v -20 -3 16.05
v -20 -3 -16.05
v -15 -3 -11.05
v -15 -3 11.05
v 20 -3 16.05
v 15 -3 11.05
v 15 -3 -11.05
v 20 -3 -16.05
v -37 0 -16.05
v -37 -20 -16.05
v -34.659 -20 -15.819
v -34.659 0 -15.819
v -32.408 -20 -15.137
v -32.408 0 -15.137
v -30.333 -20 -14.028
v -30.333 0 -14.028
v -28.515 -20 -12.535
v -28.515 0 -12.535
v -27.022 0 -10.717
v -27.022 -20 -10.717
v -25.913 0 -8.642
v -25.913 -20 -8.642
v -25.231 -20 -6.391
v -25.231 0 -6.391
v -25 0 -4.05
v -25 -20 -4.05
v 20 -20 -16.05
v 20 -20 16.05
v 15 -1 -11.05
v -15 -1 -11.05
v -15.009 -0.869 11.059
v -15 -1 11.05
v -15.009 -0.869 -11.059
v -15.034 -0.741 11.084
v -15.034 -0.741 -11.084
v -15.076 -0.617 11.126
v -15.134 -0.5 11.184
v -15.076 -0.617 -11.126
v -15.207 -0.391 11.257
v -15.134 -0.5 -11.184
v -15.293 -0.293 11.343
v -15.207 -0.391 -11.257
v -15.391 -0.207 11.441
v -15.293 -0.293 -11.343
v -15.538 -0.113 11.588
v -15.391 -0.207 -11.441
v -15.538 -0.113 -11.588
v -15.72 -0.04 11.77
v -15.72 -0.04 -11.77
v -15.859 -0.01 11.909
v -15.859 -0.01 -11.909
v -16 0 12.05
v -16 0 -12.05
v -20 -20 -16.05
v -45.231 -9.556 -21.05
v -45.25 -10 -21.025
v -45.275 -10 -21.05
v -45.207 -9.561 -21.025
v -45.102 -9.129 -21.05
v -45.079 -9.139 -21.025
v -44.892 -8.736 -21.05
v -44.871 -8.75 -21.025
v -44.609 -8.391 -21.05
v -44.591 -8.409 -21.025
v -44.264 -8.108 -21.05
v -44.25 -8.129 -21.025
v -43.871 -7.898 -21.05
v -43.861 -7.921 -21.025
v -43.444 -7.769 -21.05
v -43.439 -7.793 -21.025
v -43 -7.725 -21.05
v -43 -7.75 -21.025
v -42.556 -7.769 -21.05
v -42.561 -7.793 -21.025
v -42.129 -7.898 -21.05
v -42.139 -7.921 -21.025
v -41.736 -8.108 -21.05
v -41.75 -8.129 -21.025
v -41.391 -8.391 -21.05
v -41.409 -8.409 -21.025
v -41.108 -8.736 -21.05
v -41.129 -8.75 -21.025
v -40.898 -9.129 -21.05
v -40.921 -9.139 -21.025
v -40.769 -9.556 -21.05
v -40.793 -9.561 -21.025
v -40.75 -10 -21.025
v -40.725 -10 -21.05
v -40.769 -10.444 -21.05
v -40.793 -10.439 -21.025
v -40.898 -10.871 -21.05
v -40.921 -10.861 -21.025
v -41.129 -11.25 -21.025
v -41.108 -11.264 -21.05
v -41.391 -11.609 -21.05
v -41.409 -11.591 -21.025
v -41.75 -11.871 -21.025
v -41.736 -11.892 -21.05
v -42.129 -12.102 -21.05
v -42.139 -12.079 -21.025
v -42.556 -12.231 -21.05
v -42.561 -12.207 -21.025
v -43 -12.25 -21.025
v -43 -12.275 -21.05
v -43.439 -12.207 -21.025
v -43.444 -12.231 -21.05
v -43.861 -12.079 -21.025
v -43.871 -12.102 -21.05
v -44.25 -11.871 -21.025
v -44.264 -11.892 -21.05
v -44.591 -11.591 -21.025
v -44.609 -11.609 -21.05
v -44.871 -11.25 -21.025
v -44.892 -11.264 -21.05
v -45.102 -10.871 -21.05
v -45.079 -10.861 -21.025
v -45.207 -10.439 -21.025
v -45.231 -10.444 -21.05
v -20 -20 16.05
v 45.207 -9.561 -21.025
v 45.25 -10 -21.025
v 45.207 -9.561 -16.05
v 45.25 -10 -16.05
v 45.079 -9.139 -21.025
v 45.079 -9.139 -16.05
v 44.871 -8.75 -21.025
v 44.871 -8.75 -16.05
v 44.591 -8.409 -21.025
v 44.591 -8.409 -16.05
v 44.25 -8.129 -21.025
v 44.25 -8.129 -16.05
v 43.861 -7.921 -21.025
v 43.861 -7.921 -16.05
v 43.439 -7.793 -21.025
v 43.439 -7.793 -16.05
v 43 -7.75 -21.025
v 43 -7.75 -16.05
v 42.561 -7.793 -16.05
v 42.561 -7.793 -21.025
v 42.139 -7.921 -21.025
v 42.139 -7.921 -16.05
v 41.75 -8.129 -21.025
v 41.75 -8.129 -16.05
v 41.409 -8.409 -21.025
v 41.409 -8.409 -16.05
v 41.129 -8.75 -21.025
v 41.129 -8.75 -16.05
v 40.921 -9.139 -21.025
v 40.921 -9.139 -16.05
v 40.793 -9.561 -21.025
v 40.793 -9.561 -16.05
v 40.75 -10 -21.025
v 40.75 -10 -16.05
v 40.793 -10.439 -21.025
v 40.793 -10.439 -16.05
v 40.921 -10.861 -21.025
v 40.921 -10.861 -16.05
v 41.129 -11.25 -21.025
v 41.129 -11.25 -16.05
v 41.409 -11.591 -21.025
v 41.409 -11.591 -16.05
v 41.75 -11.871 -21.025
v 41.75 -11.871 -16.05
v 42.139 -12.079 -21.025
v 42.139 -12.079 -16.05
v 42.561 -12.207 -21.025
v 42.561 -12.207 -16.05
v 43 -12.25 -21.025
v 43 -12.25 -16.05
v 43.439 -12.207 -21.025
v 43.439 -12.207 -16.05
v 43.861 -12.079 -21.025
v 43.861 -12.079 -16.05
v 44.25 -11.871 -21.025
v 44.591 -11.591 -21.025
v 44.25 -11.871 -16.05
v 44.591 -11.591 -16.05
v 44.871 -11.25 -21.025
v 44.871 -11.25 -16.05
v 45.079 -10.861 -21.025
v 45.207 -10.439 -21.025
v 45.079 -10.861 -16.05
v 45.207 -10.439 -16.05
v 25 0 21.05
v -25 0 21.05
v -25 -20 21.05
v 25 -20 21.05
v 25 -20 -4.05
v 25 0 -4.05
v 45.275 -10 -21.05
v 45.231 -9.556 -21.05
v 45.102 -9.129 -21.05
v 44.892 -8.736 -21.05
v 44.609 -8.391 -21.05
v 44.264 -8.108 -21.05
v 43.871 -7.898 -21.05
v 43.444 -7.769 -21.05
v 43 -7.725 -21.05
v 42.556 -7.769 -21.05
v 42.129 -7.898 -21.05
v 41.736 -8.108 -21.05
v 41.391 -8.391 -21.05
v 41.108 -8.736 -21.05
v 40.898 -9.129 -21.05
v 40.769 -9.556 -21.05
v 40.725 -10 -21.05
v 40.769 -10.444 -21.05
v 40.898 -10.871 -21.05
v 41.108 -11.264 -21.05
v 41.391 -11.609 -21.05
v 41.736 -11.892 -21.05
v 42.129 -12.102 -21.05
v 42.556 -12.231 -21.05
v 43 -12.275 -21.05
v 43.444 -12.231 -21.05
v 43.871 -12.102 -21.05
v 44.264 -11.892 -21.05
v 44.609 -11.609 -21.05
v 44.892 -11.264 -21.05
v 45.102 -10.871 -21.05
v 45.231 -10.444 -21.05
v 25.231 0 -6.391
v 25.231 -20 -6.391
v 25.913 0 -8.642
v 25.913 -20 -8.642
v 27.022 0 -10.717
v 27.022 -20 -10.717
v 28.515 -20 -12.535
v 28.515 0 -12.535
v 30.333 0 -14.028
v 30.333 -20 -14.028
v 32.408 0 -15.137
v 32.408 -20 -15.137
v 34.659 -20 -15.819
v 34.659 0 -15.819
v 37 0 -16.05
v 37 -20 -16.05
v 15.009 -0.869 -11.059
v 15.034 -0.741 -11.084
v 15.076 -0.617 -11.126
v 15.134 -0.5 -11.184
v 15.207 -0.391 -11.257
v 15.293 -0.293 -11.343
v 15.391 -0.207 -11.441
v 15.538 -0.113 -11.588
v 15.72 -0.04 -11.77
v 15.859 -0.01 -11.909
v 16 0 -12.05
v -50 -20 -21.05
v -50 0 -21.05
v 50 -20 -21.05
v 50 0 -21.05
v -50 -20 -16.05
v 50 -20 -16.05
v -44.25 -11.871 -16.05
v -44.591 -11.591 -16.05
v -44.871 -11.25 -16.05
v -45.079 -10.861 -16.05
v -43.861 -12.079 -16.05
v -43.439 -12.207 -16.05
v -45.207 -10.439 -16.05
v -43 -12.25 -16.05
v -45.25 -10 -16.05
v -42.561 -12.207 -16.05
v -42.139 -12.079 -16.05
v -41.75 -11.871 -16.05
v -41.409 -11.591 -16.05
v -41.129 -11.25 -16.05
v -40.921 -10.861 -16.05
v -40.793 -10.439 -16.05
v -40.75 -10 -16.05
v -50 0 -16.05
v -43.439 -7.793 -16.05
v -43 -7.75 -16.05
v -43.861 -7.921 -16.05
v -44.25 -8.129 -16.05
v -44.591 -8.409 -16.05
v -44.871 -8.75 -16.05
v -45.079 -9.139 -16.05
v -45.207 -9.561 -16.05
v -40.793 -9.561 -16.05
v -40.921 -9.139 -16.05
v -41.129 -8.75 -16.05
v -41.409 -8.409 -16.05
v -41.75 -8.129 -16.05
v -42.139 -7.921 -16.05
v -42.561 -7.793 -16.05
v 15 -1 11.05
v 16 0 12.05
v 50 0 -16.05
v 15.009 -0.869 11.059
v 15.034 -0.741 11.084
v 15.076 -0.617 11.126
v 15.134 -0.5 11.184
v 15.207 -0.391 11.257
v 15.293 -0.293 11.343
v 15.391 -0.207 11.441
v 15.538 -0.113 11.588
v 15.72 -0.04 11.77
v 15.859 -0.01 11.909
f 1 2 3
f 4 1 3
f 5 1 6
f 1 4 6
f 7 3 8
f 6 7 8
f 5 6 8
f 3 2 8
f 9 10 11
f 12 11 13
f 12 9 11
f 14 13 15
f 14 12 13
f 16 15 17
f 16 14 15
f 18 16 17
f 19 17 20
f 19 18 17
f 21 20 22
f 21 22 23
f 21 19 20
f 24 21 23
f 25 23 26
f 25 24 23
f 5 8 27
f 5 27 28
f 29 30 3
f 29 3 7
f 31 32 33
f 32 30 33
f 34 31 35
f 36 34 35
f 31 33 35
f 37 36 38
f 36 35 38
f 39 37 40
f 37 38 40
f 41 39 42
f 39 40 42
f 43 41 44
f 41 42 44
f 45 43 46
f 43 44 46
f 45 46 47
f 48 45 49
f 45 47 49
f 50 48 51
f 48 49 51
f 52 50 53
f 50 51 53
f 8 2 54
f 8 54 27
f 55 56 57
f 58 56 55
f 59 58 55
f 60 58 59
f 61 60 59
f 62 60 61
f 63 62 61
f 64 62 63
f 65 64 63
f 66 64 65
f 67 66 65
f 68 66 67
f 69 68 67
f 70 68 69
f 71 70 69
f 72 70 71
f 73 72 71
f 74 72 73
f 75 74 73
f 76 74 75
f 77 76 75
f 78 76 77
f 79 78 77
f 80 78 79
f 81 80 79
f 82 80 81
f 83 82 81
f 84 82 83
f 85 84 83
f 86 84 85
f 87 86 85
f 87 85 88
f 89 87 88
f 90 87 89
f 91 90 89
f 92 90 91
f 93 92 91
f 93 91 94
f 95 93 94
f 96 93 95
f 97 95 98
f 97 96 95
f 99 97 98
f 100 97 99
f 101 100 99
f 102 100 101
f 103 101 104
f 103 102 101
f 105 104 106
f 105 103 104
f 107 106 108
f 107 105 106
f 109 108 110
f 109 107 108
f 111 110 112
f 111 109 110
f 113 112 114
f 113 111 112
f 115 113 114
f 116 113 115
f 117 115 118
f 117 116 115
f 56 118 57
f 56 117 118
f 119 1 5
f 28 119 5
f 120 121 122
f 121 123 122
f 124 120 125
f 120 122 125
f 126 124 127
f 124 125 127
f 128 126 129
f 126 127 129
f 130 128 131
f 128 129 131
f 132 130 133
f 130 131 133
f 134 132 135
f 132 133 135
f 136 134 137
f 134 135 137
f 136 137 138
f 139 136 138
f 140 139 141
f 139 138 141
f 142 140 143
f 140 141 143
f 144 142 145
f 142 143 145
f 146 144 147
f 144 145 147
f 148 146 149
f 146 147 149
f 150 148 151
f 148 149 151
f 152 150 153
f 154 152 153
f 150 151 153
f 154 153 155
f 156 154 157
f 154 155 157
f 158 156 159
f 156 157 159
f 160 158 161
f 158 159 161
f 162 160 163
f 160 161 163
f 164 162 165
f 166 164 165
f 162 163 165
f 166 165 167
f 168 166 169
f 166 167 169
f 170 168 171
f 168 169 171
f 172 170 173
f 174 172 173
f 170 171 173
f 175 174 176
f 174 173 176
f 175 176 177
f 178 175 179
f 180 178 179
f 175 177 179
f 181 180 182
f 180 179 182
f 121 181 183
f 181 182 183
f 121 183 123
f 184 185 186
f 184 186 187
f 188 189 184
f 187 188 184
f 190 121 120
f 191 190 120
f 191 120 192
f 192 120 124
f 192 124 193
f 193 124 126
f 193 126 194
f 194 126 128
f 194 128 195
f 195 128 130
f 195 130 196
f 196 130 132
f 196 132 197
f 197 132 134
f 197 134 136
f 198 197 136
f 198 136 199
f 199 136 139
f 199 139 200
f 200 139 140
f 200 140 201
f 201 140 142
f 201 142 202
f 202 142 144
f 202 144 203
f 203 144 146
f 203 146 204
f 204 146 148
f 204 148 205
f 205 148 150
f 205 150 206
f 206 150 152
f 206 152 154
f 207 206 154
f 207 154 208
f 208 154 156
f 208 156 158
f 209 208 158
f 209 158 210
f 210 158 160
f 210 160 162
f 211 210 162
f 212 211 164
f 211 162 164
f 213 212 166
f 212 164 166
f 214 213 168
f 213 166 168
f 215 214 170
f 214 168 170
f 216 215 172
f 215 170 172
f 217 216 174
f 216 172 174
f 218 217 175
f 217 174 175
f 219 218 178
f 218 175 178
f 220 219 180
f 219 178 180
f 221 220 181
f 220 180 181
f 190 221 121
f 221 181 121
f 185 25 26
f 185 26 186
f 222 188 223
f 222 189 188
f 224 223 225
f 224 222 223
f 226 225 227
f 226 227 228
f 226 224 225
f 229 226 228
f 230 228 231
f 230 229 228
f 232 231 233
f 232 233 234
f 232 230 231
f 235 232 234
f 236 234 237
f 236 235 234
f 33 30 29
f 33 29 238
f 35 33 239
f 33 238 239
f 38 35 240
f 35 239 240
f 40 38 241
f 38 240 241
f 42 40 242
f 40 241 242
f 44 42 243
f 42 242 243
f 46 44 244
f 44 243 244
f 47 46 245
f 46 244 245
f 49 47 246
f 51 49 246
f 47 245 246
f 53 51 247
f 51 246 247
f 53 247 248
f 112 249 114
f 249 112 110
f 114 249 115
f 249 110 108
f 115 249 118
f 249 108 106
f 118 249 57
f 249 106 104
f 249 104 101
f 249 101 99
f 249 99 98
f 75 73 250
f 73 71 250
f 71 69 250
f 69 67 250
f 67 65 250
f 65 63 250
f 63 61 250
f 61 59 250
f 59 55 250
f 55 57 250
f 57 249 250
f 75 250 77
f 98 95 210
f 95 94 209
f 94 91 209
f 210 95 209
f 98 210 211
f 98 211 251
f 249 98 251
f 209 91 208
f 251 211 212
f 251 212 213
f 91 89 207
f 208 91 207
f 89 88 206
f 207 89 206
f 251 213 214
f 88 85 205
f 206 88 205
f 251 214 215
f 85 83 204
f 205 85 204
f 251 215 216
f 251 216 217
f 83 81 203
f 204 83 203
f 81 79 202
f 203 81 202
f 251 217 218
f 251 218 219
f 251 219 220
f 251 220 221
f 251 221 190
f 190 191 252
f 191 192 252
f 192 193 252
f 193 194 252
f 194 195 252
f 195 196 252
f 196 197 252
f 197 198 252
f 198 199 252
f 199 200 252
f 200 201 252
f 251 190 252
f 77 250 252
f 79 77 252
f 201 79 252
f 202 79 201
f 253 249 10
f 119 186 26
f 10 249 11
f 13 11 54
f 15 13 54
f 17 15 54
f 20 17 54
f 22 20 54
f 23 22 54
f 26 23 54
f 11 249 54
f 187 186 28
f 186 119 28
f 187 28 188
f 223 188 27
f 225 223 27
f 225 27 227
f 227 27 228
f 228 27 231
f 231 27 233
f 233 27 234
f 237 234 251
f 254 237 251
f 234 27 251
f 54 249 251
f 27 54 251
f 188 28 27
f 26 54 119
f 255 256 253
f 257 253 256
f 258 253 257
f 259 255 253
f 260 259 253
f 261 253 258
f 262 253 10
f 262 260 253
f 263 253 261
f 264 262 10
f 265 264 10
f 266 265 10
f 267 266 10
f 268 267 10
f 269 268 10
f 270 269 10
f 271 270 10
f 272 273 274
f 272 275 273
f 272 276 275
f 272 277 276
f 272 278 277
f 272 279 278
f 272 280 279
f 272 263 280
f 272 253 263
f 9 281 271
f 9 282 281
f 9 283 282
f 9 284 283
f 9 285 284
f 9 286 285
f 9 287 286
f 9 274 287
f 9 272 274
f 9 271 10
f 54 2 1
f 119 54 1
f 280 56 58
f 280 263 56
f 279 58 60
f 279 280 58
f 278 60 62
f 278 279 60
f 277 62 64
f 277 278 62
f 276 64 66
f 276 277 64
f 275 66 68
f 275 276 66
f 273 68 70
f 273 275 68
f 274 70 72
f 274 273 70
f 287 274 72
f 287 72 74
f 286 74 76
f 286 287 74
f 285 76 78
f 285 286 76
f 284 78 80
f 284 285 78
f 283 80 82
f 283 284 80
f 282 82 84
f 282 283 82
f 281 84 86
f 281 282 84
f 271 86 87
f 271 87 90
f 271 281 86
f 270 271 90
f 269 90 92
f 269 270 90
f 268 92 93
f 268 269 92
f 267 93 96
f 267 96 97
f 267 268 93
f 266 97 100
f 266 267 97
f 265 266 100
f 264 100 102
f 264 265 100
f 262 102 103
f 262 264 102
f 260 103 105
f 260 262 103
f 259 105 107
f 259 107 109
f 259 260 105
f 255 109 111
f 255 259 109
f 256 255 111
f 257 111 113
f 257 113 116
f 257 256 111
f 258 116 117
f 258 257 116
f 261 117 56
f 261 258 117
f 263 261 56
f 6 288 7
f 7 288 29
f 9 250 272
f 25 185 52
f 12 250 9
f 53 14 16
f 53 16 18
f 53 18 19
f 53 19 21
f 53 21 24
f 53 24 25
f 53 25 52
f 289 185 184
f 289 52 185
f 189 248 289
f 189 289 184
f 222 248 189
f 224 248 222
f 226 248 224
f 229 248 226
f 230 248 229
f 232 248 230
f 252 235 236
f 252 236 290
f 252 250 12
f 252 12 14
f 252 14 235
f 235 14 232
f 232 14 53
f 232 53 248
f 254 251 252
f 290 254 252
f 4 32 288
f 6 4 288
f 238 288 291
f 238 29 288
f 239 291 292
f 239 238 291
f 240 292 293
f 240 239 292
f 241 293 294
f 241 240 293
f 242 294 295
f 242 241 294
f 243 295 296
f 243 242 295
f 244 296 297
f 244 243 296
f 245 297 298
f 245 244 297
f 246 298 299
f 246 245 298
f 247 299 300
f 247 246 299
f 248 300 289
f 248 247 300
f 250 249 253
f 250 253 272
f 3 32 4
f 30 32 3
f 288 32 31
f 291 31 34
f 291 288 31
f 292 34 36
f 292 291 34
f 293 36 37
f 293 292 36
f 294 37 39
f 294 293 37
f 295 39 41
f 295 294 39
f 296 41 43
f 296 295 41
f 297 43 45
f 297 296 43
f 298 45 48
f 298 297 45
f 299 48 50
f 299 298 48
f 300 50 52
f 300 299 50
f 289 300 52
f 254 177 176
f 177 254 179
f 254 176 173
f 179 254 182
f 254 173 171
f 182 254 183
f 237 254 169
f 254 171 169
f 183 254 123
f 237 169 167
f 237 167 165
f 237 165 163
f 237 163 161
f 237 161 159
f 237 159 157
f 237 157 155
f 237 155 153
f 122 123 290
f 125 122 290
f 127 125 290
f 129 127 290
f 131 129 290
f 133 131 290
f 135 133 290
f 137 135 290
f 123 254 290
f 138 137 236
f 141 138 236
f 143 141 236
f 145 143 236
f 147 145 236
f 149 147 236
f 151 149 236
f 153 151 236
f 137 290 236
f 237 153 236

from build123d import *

# Parameters (mm, degrees)
SKETCH1_W                      = 50
SKETCH1_H                      = 42.1
SKETCH1_W_2                    = 30
SKETCH1_H_2                    = 22.1
BOSS_EXTRUDE2_DEPTH            = 3
FILLET1_R                      = 1
SKETCH2_W                      = 50
SKETCH2_H                      = 42.1
SKETCH2_W_2                    = 40
SKETCH2_H_2                    = 32.1
BOSS_EXTRUDE3_DEPTH            = 17
SKETCH3_W                      = 25
SKETCH3_H                      = 20
BOSS_EXTRUDE4_DEPTH            = 5
M4_CLEARANCE_HOLE1_D           = 4.5
M4_CLEARANCE_HOLE1_CSINK_D     = 4.55
M4_CLEARANCE_HOLE1_CSINK_ANGLE = 90
FILLET2_R                      = 12


with BuildPart() as part:
    # Sketch1 → Boss-Extrude2 (new body)
    with BuildSketch(Plane(origin=(0, 0, 0), x_dir=(1, 0, 0), z_dir=(0, 1, 0))):
        Rectangle(SKETCH1_W, SKETCH1_H)
        Rectangle(SKETCH1_W_2, SKETCH1_H_2, mode=Mode.SUBTRACT)
    extrude(amount=-BOSS_EXTRUDE2_DEPTH)

    # Fillet1
    fillet1_edges = [part.edges().sort_by_distance(p)[0] for p in [
        (15, 0, 0),
        (0, 0, -11.05),
        (-15, 0, 0),
        (0, 0, 11.05),
    ]]
    fillet(fillet1_edges, radius=FILLET1_R)

    # Sketch2 → Boss-Extrude3 (add)
    with BuildSketch(Plane.XZ.offset(3)):
        Rectangle(SKETCH2_W, SKETCH2_H)
        Rectangle(SKETCH2_W_2, SKETCH2_H_2, mode=Mode.SUBTRACT)
    extrude(amount=BOSS_EXTRUDE3_DEPTH)

    # Sketch3 → Boss-Extrude4 (add)
    with BuildSketch(Plane(origin=(0, 0, -21.05), x_dir=(-1, 0, 0), z_dir=(0, 0, -1))):
        with Locations((-37.5, -10)):
            Rectangle(SKETCH3_W, SKETCH3_H)
    boss_extrude4 = extrude(amount=-BOSS_EXTRUDE4_DEPTH)

    # M4 Clearance Hole1 (through all)
    with Locations(Plane(origin=(43, -10, -21.05), x_dir=(-1, 0, 0), z_dir=(0, 0, -1))):
        with Locations((0, 0)):
            m4_clearance_hole1 = CounterSinkHole(M4_CLEARANCE_HOLE1_D / 2, M4_CLEARANCE_HOLE1_CSINK_D / 2, counter_sink_angle=M4_CLEARANCE_HOLE1_CSINK_ANGLE)

    # Mirror4: Boss-Extrude4, M4 Clearance Hole1 across plane
    add(boss_extrude4.mirror(Plane(origin=(0, 0, 0), x_dir=(0, 0, 1), z_dir=(1, 0, 0))))
    add(m4_clearance_hole1.mirror(Plane(origin=(0, 0, 0), x_dir=(0, 0, 1), z_dir=(1, 0, 0))), mode=Mode.SUBTRACT)

    # Fillet2
    fillet2_edges = [part.edges().sort_by_distance(p)[0] for p in [
        (25, -10, -16.05),
        (-25, -10, -16.05),
    ]]
    fillet(fillet2_edges, radius=FILLET2_R)


solid = part.part
